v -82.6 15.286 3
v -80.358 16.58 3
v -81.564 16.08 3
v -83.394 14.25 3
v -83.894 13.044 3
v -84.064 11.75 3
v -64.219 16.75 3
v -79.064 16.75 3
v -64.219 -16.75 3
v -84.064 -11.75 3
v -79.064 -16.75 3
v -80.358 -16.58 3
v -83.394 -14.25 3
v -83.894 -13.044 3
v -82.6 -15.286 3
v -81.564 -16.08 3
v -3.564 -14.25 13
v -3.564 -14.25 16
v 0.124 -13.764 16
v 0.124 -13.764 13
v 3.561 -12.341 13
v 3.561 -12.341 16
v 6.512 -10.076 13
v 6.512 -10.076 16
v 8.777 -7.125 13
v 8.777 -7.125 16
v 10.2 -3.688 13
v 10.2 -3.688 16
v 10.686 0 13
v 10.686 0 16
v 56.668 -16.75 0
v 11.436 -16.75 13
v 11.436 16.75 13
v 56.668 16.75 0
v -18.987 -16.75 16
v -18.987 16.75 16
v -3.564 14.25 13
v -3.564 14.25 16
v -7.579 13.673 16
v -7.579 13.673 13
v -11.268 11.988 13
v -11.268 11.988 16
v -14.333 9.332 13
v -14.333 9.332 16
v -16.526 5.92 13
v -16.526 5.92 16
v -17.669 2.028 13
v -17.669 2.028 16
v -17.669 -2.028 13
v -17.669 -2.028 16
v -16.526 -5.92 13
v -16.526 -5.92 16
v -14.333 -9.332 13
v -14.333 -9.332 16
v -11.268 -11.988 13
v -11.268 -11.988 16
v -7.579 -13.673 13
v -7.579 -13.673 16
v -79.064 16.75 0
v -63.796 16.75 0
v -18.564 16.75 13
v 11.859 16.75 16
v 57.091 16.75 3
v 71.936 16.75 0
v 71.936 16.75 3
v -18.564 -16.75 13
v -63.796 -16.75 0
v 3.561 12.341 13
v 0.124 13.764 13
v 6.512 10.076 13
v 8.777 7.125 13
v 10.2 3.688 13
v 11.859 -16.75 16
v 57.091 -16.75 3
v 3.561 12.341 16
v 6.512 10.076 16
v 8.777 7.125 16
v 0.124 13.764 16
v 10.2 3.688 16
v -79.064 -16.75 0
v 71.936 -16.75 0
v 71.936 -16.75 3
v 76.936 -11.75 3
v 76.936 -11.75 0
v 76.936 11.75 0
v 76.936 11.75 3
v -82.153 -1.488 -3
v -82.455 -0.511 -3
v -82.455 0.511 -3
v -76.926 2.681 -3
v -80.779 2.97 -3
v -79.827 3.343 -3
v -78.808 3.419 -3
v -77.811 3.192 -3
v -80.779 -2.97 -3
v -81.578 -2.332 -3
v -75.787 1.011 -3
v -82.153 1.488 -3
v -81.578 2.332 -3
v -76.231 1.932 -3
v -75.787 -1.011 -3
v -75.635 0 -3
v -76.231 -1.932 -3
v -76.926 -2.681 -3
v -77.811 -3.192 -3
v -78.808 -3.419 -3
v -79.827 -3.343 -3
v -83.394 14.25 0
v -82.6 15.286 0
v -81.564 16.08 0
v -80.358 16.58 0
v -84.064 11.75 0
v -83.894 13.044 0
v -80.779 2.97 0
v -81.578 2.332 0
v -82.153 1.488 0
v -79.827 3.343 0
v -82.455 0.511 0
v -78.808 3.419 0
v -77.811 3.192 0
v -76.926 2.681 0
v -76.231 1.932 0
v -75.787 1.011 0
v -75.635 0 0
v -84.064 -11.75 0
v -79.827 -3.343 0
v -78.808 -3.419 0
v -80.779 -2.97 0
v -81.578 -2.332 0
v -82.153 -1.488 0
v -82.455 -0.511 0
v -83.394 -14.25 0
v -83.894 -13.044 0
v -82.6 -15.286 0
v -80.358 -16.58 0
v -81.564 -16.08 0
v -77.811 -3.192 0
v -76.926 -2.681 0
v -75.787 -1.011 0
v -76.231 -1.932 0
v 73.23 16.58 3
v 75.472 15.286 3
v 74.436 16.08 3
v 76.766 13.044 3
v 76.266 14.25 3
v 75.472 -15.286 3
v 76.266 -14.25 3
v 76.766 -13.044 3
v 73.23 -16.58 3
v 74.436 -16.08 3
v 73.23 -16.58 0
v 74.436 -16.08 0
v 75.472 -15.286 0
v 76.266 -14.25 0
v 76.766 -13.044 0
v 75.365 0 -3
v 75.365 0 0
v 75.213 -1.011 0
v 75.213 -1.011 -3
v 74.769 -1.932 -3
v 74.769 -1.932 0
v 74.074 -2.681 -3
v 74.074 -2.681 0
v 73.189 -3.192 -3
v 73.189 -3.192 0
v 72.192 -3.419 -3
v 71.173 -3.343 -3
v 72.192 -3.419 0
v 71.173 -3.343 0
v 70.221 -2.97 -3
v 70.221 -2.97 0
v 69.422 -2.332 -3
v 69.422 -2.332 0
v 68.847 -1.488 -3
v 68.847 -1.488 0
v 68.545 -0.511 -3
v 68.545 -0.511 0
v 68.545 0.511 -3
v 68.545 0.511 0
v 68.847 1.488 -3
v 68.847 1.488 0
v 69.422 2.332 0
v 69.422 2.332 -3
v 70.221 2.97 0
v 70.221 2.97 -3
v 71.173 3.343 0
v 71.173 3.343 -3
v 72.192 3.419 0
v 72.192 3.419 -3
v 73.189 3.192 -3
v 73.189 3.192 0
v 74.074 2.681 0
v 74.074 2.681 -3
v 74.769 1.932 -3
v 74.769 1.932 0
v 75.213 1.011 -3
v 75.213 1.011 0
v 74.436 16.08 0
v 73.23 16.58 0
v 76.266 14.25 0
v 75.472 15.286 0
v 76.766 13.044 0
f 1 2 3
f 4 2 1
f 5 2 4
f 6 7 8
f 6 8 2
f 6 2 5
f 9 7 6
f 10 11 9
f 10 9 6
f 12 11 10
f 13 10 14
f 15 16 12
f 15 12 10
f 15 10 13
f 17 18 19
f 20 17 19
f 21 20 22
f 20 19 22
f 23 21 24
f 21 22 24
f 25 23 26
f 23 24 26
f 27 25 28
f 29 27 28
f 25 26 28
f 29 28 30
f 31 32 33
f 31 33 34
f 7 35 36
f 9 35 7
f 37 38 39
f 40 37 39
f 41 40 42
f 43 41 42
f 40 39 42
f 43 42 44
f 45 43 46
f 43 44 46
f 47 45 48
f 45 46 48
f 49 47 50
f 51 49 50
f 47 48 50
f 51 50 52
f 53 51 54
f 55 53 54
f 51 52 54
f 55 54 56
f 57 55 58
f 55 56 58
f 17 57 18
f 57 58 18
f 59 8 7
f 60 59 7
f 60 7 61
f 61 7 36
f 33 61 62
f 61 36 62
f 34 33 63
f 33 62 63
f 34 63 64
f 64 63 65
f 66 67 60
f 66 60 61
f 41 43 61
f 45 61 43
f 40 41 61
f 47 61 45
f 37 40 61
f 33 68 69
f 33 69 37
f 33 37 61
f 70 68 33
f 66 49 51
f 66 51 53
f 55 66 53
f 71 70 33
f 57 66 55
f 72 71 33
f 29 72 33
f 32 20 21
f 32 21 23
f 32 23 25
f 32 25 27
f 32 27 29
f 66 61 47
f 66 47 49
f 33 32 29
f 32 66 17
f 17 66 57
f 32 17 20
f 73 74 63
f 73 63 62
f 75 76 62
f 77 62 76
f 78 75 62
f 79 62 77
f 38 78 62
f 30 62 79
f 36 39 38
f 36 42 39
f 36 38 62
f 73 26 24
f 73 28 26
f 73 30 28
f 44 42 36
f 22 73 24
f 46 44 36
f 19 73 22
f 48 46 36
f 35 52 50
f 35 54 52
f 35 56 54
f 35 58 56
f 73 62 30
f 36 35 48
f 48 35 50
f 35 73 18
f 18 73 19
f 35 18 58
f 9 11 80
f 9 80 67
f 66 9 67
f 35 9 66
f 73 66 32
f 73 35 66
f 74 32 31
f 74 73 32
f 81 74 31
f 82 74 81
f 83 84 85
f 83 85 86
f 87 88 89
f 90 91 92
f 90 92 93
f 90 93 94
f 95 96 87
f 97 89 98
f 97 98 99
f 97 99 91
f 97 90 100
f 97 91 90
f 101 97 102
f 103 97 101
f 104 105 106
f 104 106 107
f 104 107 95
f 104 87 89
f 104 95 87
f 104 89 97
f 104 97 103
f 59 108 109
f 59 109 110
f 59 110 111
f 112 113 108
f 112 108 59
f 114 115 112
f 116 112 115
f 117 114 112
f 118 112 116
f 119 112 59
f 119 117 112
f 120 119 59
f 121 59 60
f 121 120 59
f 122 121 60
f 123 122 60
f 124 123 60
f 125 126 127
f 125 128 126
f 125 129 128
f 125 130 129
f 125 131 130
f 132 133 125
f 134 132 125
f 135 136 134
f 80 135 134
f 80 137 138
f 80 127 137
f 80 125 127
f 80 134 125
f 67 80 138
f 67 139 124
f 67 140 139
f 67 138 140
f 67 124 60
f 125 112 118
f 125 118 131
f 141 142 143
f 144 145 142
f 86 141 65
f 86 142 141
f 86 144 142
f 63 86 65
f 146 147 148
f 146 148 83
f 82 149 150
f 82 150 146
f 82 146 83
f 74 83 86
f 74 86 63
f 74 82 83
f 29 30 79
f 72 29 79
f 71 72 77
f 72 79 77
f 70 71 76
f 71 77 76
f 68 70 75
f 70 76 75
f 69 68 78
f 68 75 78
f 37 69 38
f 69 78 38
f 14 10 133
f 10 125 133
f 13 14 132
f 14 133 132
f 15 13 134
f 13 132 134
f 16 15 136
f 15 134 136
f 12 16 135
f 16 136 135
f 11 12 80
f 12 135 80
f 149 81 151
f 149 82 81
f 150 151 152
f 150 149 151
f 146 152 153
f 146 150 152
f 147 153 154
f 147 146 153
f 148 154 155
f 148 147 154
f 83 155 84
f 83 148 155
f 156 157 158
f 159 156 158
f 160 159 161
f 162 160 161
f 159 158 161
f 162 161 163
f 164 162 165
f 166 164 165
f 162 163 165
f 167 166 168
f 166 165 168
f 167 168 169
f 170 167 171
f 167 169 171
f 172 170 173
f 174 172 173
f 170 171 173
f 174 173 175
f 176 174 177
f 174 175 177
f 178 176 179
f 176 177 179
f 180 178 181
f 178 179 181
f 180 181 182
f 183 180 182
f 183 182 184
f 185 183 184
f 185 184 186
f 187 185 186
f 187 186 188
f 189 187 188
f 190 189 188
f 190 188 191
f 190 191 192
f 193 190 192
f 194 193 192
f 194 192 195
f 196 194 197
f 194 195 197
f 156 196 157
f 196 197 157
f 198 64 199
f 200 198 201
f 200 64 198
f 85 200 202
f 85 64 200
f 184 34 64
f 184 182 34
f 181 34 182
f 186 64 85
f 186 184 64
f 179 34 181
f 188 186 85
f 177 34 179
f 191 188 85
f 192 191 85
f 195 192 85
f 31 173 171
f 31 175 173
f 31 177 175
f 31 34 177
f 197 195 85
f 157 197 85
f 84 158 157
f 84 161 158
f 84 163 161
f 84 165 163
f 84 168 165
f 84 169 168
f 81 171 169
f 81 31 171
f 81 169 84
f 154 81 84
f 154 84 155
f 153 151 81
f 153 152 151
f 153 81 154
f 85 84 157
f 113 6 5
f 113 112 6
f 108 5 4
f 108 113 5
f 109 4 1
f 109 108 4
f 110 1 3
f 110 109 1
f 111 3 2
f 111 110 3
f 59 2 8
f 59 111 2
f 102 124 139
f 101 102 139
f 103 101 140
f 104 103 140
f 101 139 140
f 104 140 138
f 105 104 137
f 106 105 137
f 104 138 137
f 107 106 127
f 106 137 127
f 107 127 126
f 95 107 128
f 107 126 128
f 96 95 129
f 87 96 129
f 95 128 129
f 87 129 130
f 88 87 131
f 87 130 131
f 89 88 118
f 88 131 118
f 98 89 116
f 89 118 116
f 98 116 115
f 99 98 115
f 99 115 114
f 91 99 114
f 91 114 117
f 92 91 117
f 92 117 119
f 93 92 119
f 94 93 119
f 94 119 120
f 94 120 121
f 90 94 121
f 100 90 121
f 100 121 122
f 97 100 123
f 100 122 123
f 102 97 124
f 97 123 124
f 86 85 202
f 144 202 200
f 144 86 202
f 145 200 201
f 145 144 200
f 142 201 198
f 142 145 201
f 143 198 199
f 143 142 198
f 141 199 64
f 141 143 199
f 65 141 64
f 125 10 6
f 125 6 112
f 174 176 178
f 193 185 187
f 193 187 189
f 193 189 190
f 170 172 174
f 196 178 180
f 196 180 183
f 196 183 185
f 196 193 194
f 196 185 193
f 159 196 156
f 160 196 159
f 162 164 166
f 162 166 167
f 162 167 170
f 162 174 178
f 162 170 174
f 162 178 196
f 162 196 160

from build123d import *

# Parameters (mm, degrees)
F2_DEPTH = 16.75
F4_DEPTH = 16.001
F5_R     = 3.429
F6_R     = 3.429
F7_DEPTH = 3
F8_R     = 5
F9_R     = 5
F10_R    = 5
F11_R    = 5


with BuildPart() as f2:
    # F1 (on Front) → F2 (new body, symmetric)
    with BuildSketch(Plane.XZ):
        Polygon((-84.0640169114, 3), (-84.0640169114, 0), (-63.7959806109, 0), (-18.5640169114, 13), (11.4359830886, 13), (56.667946788, 0), (76.9359830886, 0), (76.9359830886, 3), (57.0905048336, 3), (11.8585411342, 16), (-18.986574957, 16), (-64.2185386565, 3), align=None)
    extrude(amount=F2_DEPTH, both=True)

    # F3 (on face) → F4 (cut, through all)
    with BuildSketch(Plane.XY.offset(16)):
        with BuildLine():
            ThreePointArc((-3.5640168758, -14.25), (6.5122547331, -10.0762716193), (10.6859830886, 0))
            ThreePointArc((10.6859830886, 0), (6.5122547205, 10.0762716319), (-3.5640169114, 14.25))
            ThreePointArc((-3.5640169114, 14.25), (-17.8140169114, -1.78e-08), (-3.5640168758, -14.25))
        make_face()
    extrude(amount=-F4_DEPTH, mode=Mode.SUBTRACT)

    # F5 (on face) + F6 (on face) → F7 (join)
    with BuildSketch(Plane(origin=(0, 0, 0), x_dir=(1, 0, 0), z_dir=(0, 0, -1))):
        with Locations((-79.0640169114, 0)):
            Circle(F5_R)
    with BuildSketch(Plane(origin=(0, 0, 0), x_dir=(1, 0, 0), z_dir=(0, 0, -1))):
        with Locations((71.9359830886, 0)):
            Circle(F6_R)
    extrude(amount=F7_DEPTH)

    # F8
    f8_edges = [f2.edges().sort_by_distance(p)[0] for p in [
        (-84.064017, -16.75, 1.5),
    ]]
    fillet(f8_edges, radius=F8_R)

    # F9
    f9_edges = [f2.edges().sort_by_distance(p)[0] for p in [
        (-84.064017, 16.75, 1.5),
    ]]
    fillet(f9_edges, radius=F9_R)

    # F10
    f10_edges = [f2.edges().sort_by_distance(p)[0] for p in [
        (76.935983, -16.75, 1.5),
    ]]
    fillet(f10_edges, radius=F10_R)

    # F11
    f11_edges = [f2.edges().sort_by_distance(p)[0] for p in [
        (76.935983, 16.75, 1.5),
    ]]
    fillet(f11_edges, radius=F11_R)


solid = f2.part
